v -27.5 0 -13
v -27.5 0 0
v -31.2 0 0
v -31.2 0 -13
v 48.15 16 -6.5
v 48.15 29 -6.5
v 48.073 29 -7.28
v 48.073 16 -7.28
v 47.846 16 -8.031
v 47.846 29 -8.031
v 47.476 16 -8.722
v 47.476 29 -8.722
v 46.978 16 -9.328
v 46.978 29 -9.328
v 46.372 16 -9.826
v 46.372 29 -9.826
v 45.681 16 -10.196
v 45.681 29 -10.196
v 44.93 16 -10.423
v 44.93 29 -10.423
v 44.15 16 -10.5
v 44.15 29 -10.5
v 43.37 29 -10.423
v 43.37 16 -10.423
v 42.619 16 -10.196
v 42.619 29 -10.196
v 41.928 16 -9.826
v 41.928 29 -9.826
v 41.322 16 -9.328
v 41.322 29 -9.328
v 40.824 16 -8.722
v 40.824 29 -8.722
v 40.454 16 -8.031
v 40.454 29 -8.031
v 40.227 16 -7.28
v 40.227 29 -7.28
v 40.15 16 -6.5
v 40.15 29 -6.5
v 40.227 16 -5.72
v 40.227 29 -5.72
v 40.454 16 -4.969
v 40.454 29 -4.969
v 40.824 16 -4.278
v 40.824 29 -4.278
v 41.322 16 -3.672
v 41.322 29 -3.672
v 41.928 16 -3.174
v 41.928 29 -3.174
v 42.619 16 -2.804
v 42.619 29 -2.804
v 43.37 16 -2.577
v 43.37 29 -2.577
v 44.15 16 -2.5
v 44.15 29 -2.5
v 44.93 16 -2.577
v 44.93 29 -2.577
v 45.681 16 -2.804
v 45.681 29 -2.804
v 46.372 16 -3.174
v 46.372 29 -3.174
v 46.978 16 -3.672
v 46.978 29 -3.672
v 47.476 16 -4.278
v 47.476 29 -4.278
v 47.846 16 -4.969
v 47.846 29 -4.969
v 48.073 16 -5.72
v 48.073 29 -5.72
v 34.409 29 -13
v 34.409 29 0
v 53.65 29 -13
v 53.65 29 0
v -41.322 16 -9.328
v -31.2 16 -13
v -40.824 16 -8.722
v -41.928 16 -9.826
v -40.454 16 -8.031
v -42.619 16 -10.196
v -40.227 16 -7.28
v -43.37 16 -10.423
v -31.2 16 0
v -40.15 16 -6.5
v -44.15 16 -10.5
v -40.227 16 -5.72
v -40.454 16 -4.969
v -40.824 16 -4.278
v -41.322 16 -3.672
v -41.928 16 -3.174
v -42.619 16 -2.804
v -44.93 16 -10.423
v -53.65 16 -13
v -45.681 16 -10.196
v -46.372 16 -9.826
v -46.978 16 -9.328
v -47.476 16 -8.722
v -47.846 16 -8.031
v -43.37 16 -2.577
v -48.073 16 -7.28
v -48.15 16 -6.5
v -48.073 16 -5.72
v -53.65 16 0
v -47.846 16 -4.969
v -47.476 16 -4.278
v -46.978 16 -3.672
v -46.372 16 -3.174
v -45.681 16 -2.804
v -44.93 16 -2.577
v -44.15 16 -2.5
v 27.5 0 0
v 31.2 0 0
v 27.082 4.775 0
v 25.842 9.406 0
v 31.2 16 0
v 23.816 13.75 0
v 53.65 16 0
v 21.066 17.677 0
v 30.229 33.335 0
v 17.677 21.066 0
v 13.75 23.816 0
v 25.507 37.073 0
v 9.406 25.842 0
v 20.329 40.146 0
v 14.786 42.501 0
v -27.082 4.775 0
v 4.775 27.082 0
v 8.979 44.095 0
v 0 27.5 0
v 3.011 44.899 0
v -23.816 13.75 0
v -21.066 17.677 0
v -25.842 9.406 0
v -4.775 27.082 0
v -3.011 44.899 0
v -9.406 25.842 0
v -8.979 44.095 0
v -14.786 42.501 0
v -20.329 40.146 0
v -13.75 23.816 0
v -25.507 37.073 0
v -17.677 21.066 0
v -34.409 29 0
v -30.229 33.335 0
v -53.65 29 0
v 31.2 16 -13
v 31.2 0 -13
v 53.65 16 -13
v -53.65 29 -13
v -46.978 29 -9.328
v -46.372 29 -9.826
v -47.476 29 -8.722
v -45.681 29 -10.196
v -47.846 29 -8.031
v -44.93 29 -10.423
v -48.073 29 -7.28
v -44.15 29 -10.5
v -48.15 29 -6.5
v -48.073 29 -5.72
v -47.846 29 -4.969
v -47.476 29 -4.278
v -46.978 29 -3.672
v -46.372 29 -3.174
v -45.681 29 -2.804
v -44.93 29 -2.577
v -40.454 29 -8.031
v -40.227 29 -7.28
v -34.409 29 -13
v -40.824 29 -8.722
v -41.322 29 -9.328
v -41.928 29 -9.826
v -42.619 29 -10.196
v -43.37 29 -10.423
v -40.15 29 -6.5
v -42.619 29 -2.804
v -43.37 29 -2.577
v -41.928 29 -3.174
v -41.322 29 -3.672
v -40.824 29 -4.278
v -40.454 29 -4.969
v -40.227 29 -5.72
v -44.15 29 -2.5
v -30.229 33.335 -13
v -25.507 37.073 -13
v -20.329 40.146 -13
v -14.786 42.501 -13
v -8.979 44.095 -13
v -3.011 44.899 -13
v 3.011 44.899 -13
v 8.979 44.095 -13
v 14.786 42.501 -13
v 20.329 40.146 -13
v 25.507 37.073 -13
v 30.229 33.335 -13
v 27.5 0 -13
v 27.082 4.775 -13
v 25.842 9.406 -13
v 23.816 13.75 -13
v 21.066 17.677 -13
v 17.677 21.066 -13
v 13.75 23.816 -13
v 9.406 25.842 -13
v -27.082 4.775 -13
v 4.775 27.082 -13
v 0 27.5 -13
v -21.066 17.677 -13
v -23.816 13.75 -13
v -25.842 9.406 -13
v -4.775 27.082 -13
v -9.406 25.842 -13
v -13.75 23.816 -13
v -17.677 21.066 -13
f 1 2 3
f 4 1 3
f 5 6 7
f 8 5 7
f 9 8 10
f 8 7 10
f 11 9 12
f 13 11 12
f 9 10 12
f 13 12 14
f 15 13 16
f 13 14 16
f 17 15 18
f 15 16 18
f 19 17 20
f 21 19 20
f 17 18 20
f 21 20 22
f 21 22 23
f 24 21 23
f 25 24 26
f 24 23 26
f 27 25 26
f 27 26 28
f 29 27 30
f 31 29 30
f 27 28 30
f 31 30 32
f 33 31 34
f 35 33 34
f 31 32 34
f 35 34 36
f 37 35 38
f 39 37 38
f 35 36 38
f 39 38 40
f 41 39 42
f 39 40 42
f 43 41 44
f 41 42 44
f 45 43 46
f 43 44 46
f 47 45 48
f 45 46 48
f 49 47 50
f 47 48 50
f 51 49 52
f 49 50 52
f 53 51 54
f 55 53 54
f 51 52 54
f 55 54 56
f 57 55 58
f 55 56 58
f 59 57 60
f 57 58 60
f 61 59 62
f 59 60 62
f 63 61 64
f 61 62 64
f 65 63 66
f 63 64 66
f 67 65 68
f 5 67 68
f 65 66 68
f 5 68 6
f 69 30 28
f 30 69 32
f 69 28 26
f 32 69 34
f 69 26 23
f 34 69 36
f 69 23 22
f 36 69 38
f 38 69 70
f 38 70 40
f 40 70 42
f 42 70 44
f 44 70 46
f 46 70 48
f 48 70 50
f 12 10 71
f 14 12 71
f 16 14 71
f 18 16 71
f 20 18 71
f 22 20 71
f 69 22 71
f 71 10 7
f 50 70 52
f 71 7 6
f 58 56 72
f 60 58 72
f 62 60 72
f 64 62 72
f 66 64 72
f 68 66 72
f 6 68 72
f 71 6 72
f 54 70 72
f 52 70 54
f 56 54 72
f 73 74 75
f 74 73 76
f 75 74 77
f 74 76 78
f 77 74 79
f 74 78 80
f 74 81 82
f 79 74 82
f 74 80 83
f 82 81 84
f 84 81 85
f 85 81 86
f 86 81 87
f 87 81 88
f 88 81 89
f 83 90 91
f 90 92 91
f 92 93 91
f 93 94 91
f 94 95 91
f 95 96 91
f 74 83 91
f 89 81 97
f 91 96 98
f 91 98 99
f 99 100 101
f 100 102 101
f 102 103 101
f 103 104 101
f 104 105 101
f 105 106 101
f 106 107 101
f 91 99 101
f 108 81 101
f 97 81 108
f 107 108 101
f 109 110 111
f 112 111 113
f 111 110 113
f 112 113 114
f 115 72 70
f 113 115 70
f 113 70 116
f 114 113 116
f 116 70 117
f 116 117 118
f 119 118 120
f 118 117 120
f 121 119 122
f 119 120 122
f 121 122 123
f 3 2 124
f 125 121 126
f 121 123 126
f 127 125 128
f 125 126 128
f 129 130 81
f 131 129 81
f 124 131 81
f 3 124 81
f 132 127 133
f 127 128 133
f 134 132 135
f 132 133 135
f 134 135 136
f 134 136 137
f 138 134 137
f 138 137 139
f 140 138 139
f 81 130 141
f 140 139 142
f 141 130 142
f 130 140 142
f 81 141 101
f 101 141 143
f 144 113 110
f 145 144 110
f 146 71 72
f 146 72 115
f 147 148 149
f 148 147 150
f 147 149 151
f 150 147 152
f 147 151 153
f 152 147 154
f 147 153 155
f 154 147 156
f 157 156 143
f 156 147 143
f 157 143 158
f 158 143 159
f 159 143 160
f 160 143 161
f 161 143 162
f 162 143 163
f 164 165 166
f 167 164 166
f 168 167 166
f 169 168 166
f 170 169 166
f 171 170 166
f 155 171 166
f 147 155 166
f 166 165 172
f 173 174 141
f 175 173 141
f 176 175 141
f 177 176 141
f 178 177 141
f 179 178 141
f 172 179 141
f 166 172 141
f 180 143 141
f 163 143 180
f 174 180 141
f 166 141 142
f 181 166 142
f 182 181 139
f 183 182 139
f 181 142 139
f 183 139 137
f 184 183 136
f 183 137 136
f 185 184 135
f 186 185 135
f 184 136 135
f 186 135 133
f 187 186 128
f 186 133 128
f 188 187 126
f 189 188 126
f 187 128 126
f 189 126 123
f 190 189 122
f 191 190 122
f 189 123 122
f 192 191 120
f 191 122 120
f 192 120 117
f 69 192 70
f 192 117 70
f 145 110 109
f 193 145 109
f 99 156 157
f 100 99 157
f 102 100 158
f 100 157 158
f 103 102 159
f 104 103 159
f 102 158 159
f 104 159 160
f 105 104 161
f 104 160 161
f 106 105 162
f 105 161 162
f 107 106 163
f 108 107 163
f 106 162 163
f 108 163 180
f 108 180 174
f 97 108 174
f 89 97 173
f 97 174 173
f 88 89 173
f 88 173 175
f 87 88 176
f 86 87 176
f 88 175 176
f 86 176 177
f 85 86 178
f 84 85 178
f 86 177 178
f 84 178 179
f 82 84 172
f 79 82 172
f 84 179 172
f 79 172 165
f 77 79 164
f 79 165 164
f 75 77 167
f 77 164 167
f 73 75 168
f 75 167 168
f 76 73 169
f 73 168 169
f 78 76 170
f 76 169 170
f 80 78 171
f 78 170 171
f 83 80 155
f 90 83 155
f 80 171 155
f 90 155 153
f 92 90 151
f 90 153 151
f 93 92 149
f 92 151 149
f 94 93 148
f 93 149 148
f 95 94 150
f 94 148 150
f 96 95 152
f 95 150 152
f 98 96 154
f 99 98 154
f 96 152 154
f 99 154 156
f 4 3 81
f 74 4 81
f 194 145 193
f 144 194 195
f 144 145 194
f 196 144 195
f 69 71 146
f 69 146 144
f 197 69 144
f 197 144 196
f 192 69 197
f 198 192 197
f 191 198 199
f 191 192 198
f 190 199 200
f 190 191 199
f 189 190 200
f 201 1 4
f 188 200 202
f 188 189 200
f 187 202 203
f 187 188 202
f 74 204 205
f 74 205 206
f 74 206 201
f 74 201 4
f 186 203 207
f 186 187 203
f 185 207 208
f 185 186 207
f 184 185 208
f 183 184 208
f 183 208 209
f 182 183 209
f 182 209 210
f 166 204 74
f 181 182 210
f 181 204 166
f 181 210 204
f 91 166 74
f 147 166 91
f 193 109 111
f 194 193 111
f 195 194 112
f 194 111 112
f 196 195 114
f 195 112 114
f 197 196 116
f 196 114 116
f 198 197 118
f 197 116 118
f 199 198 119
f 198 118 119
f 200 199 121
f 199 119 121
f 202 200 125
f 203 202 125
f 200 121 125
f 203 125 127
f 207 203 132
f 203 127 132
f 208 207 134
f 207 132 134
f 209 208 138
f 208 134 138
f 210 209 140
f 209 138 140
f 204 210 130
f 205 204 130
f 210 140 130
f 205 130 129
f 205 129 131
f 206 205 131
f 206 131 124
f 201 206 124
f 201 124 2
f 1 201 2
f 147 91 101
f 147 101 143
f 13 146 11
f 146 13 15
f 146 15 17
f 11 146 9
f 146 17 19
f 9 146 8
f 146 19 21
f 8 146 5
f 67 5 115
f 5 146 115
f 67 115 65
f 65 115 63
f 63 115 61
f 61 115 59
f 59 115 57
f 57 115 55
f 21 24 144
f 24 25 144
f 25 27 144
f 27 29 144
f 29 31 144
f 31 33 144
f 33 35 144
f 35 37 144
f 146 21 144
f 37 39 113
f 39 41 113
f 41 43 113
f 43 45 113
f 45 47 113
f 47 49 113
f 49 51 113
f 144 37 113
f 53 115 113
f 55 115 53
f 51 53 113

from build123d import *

# Parameters (mm, degrees)
BOSS_EXTRUDE1_DEPTH = 13
SKETCH3_R           = 4
CUT_EXTRUDE1_DEPTH  = 13


with BuildPart() as part:
    # Sketch1 → Boss-Extrude1 (new body)
    with BuildSketch(Plane.XY):
        with BuildLine():
            Line((-27.5, 0), (-31.2, 0))
            Line((-31.2, 0), (-31.2, 16))
            Line((-31.2, 16), (-53.65, 16))
            Line((-53.65, 16), (-53.65, 29))
            Line((-53.65, 29), (-34.409301068, 29))
            ThreePointArc((-34.409301068, 29), (0, 45), (34.409301068, 29))
            Line((34.409301068, 29), (53.65, 29))
            Line((53.65, 29), (53.65, 16))
            Line((53.65, 16), (31.2, 16))
            Line((31.2, 16), (31.2, 0))
            Line((31.2, 0), (27.5, 0))
            ThreePointArc((27.5, 0), (0, 27.5), (-27.5, 0))
        make_face()
    extrude(amount=-BOSS_EXTRUDE1_DEPTH)

    # Sketch3 → Cut-Extrude1 (cut)
    with BuildSketch(Plane(origin=(0, 29, 0), x_dir=(1, 0, 0), z_dir=(0, 1, 0))):
        with Locations(Location((-44.15, 6.5, 0), (0, 0, 180))):
            Circle(SKETCH3_R)
        with Locations((44.15, 6.5)):
            Circle(SKETCH3_R)
    extrude(amount=-CUT_EXTRUDE1_DEPTH, mode=Mode.SUBTRACT)


solid = part.part
